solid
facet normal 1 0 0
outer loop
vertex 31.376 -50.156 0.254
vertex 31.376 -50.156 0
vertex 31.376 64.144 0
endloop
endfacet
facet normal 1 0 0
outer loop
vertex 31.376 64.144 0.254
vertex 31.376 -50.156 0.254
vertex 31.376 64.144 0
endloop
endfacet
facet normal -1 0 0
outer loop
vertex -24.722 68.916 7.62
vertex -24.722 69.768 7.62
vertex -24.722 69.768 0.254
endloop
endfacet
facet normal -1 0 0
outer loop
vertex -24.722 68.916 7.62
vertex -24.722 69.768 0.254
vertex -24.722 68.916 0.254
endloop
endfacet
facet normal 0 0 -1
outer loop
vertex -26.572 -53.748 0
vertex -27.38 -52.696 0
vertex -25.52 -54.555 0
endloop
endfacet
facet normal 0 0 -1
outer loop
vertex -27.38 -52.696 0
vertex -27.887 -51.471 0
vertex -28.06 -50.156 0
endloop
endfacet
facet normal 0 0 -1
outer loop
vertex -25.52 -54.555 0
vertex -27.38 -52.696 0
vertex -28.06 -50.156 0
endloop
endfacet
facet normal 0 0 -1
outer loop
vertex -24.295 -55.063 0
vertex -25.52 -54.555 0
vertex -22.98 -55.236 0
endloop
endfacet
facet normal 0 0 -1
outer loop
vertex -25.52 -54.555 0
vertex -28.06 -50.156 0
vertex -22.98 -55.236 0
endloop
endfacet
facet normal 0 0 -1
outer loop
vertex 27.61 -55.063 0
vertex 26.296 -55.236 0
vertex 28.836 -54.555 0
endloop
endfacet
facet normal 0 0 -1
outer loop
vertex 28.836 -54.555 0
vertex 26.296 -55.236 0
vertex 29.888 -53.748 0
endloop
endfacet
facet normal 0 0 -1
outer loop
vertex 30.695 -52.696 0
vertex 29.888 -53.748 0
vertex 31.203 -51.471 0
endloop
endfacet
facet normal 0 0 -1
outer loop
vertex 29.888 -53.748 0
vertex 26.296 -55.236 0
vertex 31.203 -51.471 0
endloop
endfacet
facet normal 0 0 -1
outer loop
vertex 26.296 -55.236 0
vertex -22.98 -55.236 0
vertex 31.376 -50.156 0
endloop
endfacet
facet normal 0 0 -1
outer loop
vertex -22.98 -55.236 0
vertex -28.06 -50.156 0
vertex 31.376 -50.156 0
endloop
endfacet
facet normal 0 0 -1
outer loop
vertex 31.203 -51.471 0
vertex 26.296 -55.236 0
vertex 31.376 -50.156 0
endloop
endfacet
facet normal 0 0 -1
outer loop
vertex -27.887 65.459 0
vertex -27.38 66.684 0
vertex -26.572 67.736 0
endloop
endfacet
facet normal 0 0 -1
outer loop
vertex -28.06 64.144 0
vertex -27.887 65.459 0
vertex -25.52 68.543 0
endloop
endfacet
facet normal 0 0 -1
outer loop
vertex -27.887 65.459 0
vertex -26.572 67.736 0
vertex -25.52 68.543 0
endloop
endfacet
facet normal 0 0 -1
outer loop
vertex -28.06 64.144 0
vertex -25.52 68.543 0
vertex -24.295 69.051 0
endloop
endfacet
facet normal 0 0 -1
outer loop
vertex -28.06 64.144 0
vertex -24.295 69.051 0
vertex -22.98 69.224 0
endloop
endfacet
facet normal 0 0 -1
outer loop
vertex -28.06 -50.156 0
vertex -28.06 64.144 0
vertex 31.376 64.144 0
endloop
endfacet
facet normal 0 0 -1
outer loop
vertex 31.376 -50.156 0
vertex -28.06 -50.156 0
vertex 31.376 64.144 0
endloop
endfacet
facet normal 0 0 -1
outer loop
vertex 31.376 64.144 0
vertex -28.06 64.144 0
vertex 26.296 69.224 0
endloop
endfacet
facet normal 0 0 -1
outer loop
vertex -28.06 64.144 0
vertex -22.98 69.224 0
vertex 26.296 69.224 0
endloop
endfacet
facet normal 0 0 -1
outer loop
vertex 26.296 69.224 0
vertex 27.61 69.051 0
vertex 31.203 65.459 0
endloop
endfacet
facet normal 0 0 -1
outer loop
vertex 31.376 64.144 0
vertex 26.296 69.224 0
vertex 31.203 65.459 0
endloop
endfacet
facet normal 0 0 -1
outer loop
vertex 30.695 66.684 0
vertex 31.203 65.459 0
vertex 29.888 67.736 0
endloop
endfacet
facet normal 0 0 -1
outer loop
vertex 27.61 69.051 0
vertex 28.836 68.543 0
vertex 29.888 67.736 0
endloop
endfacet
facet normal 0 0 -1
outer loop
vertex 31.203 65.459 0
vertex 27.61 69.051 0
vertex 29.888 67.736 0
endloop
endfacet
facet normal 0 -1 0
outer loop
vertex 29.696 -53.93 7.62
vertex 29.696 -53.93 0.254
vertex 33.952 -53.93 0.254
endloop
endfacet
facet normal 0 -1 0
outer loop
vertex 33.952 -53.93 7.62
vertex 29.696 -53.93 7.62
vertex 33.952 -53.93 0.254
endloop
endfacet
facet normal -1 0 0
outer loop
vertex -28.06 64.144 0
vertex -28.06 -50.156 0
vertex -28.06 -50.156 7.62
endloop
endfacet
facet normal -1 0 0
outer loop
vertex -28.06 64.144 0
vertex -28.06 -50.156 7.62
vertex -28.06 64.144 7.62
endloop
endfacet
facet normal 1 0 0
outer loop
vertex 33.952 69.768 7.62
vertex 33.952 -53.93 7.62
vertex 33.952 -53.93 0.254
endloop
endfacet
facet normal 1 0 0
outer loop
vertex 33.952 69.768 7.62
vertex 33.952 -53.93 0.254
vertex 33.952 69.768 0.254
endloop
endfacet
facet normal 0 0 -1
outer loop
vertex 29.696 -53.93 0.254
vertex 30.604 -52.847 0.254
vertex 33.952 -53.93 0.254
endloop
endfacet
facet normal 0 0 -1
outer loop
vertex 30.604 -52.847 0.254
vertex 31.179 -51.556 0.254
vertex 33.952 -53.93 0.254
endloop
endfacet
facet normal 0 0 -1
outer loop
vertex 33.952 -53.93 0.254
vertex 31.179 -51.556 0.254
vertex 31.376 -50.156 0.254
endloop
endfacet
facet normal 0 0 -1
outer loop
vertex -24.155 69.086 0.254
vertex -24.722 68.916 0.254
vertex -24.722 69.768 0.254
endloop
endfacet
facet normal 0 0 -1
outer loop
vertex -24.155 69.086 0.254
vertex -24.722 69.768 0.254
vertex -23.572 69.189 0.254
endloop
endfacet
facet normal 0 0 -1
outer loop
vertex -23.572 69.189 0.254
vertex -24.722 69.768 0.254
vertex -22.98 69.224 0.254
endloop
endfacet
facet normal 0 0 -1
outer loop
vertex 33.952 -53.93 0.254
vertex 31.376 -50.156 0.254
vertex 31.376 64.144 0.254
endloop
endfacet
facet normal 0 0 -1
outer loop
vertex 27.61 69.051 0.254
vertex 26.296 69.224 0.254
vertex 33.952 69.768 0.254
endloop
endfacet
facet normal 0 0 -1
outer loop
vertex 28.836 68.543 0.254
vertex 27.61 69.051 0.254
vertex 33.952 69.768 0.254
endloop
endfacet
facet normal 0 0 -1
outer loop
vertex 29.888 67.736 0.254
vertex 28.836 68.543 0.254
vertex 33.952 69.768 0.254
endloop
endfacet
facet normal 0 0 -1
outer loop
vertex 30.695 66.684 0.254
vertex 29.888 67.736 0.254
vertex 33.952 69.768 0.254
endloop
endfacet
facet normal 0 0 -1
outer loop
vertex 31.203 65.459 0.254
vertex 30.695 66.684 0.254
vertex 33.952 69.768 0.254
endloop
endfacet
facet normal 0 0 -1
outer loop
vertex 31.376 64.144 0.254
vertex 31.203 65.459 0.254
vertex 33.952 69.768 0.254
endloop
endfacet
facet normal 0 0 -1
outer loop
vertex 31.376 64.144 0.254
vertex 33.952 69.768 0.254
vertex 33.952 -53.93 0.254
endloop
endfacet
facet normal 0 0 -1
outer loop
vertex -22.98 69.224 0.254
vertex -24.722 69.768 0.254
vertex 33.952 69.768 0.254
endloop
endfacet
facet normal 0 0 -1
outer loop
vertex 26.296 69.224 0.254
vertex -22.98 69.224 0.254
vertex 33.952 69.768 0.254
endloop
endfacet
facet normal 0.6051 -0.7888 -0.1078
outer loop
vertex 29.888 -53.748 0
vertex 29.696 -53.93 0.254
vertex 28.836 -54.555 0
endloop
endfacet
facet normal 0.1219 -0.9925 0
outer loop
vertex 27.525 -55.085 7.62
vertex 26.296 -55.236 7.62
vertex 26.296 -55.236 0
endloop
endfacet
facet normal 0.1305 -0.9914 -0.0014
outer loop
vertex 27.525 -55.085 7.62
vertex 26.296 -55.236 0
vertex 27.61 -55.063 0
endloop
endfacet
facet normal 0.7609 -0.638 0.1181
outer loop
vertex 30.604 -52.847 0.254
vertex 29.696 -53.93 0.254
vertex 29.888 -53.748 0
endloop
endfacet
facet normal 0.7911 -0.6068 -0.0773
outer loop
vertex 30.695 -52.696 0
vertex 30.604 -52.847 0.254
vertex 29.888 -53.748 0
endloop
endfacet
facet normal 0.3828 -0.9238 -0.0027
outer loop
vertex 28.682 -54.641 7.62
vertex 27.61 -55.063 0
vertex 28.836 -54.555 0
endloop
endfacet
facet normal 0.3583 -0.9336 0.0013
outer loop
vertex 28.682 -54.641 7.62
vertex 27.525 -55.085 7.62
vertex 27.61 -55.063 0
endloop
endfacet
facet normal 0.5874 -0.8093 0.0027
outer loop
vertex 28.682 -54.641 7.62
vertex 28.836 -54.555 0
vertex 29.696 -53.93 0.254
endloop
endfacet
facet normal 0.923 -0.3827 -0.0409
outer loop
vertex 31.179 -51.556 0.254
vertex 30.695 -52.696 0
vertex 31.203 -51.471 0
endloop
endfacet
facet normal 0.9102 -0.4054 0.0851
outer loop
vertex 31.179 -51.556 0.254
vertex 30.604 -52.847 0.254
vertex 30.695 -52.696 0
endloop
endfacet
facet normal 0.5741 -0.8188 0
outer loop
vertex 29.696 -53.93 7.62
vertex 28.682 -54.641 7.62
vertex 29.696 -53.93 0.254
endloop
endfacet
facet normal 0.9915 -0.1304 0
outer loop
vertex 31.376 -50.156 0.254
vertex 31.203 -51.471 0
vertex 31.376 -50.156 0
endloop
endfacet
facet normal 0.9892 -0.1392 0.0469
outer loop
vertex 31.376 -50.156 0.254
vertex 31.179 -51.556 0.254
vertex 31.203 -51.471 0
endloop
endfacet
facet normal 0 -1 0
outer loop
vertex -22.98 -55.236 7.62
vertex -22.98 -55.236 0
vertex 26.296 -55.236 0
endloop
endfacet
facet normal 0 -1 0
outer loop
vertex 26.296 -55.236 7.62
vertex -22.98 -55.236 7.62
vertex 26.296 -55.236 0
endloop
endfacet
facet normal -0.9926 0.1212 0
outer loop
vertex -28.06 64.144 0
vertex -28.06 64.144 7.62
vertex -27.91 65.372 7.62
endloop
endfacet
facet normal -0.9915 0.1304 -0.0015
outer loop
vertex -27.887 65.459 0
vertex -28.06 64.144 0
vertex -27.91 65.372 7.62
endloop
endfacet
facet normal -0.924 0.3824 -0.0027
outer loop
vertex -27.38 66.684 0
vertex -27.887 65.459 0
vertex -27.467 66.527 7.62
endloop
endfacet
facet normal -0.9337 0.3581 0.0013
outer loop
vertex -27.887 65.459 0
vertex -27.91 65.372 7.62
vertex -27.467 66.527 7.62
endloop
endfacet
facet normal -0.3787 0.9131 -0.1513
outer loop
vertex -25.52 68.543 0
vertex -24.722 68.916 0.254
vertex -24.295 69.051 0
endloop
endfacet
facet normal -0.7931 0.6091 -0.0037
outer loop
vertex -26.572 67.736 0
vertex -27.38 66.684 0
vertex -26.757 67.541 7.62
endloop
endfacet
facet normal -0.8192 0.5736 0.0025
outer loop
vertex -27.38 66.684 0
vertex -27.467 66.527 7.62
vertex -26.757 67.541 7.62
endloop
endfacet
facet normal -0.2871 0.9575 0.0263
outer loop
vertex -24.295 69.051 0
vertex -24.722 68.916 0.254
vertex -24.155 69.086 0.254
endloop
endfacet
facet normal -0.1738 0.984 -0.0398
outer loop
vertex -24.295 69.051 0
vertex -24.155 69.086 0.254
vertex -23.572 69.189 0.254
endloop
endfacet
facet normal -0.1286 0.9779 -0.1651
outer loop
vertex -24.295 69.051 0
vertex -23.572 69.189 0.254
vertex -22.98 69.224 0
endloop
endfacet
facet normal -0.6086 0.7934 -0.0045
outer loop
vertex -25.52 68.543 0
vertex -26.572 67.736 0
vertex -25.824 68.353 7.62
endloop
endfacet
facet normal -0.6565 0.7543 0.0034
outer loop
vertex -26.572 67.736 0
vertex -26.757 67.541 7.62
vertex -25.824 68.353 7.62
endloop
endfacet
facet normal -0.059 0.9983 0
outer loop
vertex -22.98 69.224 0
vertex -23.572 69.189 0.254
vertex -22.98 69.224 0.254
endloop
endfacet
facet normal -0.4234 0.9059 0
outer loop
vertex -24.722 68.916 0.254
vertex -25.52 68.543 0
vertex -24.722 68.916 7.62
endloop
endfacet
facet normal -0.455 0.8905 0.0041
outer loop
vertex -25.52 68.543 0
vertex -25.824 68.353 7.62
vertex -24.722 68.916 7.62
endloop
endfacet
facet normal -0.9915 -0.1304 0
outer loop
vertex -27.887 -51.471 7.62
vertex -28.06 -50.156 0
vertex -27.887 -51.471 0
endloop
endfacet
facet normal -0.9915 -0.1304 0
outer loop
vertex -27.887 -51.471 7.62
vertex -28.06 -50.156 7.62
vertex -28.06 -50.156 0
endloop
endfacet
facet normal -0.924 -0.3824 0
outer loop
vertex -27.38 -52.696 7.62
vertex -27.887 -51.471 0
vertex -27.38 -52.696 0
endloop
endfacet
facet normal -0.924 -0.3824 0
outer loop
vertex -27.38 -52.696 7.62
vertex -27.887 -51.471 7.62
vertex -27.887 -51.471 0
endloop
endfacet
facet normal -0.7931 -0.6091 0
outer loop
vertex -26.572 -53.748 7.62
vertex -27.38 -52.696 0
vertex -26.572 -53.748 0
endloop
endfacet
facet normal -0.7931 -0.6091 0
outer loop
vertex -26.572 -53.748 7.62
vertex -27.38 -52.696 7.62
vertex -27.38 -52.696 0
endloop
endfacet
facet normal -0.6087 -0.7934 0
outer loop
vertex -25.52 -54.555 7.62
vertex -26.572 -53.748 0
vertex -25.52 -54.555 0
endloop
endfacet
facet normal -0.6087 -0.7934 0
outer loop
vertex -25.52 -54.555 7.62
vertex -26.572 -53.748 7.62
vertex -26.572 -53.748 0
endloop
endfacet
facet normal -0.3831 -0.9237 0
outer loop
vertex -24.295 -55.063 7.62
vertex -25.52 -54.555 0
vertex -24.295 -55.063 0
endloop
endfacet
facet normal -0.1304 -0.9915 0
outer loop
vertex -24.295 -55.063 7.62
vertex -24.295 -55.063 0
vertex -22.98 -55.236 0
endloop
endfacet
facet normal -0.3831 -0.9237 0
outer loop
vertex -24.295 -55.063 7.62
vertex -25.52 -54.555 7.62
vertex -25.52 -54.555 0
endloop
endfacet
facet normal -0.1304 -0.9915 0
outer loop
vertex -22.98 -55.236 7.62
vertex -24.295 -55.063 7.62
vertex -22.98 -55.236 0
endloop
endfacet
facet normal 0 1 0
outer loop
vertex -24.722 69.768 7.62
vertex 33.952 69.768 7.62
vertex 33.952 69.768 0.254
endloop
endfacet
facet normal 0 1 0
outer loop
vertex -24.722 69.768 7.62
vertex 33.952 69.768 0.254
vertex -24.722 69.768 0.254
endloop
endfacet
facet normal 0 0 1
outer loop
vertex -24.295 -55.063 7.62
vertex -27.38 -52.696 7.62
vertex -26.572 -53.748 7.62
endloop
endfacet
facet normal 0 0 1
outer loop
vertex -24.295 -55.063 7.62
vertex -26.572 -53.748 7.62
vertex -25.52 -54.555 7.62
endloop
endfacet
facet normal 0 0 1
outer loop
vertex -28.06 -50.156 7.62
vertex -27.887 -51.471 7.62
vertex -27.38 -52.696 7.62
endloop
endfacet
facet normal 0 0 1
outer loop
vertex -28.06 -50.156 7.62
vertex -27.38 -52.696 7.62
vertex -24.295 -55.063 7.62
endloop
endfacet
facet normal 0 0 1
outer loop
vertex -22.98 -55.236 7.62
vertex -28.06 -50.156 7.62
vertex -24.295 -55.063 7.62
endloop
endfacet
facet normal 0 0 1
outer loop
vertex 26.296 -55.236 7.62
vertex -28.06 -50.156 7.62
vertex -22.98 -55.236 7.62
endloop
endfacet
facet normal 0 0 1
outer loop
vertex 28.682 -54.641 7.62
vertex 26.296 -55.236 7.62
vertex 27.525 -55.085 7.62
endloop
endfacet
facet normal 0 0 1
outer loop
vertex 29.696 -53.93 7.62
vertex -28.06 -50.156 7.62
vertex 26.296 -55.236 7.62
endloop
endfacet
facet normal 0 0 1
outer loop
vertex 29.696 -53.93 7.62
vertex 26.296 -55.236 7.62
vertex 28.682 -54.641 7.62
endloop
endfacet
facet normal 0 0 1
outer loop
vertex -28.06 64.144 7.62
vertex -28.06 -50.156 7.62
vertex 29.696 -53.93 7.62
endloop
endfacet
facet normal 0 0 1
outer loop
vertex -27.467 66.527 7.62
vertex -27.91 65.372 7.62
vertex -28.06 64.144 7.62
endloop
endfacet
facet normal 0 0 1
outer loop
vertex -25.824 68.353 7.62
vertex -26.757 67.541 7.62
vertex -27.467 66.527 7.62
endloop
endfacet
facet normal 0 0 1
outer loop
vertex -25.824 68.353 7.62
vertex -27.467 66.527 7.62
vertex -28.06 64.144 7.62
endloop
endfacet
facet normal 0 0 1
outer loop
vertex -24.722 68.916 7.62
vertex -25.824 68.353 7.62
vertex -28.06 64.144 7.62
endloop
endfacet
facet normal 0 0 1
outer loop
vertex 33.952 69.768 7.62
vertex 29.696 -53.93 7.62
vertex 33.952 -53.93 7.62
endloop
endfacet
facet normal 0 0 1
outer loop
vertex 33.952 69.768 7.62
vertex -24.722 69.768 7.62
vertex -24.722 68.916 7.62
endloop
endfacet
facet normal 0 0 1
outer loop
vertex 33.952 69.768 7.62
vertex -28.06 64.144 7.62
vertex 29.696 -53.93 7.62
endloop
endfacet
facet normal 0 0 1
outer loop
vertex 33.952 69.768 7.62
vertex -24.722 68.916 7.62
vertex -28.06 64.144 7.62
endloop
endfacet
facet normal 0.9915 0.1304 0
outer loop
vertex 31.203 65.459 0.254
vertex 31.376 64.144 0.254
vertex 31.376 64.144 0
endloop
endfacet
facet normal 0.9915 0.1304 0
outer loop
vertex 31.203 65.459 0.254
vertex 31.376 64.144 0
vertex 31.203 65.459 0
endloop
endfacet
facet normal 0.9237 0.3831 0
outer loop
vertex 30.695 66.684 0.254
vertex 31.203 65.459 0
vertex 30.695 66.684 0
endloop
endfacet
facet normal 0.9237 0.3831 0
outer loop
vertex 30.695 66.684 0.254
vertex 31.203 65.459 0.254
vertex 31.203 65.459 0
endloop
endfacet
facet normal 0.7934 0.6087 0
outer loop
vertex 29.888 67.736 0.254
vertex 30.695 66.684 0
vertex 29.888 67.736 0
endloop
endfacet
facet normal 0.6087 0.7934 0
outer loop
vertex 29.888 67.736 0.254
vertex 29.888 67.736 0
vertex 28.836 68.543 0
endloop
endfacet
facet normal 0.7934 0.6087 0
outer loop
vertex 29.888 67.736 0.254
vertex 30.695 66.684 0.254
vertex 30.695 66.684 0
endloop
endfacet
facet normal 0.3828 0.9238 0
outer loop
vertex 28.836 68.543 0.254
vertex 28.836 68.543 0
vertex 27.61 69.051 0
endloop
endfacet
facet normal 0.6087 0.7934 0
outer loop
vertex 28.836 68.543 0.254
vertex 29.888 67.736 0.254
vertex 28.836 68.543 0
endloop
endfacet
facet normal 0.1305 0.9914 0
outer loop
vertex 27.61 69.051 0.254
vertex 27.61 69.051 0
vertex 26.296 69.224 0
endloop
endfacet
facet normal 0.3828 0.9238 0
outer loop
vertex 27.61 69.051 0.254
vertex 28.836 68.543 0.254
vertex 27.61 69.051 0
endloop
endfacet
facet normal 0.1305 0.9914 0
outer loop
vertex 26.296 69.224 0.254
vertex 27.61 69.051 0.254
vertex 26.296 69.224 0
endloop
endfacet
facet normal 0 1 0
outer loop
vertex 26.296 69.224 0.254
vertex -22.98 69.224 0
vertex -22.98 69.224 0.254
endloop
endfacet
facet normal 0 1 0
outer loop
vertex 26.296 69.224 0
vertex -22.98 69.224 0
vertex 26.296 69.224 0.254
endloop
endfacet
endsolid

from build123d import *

# Parameters (mm, degrees)
F0_W     = 59.436
F0_H     = 124.46
F1_DEPTH = 7.62
F2_R     = 5.08
F4_DEPTH = 7.366


with BuildPart() as f1:
    # F0 (on Top) → F1 (new body)
    with BuildSketch(Plane.XY):
        with Locations((1.65762, 6.994029)):
            Rectangle(F0_W, F0_H)
    extrude(amount=F1_DEPTH)

    # F2
    f2_edges = [f1.edges().sort_by_distance(p)[0] for p in [
        (31.37562, -55.235971, 3.81),
        (-28.06038, -55.235971, 3.81),
        (31.37562, 69.224029, 3.81),
        (-28.06038, 69.224029, 3.81),
    ]]
    fillet(f2_edges, radius=F2_R)

    # F3 (on face) → F4 (join)
    with BuildSketch(Plane.XY.offset(7.62)):
        with BuildLine():
            Line((33.951722, 69.768132), (-24.722278, 69.768132))
            Line((-24.722278, 69.768132), (-24.722278, 68.916051))
            ThreePointArc((-24.722278, 68.916051), (-23.864837, 69.146442), (-22.98038, 69.224029))
            Line((-22.98038, 69.224029), (26.29562, 69.224029))
            ThreePointArc((26.29562, 69.224029), (29.887722, 67.736132), (31.37562, 64.144029))
            Line((31.37562, 64.144029), (31.37562, -50.155971))
            ThreePointArc((31.37562, -50.155971), (30.936819, -52.221321), (29.696222, -53.929868))
            Line((29.696222, -53.929868), (33.951722, -53.929868))
            Line((33.951722, -53.929868), (33.951722, 69.768132))
        make_face()
    extrude(amount=-F4_DEPTH)


solid = f1.part
